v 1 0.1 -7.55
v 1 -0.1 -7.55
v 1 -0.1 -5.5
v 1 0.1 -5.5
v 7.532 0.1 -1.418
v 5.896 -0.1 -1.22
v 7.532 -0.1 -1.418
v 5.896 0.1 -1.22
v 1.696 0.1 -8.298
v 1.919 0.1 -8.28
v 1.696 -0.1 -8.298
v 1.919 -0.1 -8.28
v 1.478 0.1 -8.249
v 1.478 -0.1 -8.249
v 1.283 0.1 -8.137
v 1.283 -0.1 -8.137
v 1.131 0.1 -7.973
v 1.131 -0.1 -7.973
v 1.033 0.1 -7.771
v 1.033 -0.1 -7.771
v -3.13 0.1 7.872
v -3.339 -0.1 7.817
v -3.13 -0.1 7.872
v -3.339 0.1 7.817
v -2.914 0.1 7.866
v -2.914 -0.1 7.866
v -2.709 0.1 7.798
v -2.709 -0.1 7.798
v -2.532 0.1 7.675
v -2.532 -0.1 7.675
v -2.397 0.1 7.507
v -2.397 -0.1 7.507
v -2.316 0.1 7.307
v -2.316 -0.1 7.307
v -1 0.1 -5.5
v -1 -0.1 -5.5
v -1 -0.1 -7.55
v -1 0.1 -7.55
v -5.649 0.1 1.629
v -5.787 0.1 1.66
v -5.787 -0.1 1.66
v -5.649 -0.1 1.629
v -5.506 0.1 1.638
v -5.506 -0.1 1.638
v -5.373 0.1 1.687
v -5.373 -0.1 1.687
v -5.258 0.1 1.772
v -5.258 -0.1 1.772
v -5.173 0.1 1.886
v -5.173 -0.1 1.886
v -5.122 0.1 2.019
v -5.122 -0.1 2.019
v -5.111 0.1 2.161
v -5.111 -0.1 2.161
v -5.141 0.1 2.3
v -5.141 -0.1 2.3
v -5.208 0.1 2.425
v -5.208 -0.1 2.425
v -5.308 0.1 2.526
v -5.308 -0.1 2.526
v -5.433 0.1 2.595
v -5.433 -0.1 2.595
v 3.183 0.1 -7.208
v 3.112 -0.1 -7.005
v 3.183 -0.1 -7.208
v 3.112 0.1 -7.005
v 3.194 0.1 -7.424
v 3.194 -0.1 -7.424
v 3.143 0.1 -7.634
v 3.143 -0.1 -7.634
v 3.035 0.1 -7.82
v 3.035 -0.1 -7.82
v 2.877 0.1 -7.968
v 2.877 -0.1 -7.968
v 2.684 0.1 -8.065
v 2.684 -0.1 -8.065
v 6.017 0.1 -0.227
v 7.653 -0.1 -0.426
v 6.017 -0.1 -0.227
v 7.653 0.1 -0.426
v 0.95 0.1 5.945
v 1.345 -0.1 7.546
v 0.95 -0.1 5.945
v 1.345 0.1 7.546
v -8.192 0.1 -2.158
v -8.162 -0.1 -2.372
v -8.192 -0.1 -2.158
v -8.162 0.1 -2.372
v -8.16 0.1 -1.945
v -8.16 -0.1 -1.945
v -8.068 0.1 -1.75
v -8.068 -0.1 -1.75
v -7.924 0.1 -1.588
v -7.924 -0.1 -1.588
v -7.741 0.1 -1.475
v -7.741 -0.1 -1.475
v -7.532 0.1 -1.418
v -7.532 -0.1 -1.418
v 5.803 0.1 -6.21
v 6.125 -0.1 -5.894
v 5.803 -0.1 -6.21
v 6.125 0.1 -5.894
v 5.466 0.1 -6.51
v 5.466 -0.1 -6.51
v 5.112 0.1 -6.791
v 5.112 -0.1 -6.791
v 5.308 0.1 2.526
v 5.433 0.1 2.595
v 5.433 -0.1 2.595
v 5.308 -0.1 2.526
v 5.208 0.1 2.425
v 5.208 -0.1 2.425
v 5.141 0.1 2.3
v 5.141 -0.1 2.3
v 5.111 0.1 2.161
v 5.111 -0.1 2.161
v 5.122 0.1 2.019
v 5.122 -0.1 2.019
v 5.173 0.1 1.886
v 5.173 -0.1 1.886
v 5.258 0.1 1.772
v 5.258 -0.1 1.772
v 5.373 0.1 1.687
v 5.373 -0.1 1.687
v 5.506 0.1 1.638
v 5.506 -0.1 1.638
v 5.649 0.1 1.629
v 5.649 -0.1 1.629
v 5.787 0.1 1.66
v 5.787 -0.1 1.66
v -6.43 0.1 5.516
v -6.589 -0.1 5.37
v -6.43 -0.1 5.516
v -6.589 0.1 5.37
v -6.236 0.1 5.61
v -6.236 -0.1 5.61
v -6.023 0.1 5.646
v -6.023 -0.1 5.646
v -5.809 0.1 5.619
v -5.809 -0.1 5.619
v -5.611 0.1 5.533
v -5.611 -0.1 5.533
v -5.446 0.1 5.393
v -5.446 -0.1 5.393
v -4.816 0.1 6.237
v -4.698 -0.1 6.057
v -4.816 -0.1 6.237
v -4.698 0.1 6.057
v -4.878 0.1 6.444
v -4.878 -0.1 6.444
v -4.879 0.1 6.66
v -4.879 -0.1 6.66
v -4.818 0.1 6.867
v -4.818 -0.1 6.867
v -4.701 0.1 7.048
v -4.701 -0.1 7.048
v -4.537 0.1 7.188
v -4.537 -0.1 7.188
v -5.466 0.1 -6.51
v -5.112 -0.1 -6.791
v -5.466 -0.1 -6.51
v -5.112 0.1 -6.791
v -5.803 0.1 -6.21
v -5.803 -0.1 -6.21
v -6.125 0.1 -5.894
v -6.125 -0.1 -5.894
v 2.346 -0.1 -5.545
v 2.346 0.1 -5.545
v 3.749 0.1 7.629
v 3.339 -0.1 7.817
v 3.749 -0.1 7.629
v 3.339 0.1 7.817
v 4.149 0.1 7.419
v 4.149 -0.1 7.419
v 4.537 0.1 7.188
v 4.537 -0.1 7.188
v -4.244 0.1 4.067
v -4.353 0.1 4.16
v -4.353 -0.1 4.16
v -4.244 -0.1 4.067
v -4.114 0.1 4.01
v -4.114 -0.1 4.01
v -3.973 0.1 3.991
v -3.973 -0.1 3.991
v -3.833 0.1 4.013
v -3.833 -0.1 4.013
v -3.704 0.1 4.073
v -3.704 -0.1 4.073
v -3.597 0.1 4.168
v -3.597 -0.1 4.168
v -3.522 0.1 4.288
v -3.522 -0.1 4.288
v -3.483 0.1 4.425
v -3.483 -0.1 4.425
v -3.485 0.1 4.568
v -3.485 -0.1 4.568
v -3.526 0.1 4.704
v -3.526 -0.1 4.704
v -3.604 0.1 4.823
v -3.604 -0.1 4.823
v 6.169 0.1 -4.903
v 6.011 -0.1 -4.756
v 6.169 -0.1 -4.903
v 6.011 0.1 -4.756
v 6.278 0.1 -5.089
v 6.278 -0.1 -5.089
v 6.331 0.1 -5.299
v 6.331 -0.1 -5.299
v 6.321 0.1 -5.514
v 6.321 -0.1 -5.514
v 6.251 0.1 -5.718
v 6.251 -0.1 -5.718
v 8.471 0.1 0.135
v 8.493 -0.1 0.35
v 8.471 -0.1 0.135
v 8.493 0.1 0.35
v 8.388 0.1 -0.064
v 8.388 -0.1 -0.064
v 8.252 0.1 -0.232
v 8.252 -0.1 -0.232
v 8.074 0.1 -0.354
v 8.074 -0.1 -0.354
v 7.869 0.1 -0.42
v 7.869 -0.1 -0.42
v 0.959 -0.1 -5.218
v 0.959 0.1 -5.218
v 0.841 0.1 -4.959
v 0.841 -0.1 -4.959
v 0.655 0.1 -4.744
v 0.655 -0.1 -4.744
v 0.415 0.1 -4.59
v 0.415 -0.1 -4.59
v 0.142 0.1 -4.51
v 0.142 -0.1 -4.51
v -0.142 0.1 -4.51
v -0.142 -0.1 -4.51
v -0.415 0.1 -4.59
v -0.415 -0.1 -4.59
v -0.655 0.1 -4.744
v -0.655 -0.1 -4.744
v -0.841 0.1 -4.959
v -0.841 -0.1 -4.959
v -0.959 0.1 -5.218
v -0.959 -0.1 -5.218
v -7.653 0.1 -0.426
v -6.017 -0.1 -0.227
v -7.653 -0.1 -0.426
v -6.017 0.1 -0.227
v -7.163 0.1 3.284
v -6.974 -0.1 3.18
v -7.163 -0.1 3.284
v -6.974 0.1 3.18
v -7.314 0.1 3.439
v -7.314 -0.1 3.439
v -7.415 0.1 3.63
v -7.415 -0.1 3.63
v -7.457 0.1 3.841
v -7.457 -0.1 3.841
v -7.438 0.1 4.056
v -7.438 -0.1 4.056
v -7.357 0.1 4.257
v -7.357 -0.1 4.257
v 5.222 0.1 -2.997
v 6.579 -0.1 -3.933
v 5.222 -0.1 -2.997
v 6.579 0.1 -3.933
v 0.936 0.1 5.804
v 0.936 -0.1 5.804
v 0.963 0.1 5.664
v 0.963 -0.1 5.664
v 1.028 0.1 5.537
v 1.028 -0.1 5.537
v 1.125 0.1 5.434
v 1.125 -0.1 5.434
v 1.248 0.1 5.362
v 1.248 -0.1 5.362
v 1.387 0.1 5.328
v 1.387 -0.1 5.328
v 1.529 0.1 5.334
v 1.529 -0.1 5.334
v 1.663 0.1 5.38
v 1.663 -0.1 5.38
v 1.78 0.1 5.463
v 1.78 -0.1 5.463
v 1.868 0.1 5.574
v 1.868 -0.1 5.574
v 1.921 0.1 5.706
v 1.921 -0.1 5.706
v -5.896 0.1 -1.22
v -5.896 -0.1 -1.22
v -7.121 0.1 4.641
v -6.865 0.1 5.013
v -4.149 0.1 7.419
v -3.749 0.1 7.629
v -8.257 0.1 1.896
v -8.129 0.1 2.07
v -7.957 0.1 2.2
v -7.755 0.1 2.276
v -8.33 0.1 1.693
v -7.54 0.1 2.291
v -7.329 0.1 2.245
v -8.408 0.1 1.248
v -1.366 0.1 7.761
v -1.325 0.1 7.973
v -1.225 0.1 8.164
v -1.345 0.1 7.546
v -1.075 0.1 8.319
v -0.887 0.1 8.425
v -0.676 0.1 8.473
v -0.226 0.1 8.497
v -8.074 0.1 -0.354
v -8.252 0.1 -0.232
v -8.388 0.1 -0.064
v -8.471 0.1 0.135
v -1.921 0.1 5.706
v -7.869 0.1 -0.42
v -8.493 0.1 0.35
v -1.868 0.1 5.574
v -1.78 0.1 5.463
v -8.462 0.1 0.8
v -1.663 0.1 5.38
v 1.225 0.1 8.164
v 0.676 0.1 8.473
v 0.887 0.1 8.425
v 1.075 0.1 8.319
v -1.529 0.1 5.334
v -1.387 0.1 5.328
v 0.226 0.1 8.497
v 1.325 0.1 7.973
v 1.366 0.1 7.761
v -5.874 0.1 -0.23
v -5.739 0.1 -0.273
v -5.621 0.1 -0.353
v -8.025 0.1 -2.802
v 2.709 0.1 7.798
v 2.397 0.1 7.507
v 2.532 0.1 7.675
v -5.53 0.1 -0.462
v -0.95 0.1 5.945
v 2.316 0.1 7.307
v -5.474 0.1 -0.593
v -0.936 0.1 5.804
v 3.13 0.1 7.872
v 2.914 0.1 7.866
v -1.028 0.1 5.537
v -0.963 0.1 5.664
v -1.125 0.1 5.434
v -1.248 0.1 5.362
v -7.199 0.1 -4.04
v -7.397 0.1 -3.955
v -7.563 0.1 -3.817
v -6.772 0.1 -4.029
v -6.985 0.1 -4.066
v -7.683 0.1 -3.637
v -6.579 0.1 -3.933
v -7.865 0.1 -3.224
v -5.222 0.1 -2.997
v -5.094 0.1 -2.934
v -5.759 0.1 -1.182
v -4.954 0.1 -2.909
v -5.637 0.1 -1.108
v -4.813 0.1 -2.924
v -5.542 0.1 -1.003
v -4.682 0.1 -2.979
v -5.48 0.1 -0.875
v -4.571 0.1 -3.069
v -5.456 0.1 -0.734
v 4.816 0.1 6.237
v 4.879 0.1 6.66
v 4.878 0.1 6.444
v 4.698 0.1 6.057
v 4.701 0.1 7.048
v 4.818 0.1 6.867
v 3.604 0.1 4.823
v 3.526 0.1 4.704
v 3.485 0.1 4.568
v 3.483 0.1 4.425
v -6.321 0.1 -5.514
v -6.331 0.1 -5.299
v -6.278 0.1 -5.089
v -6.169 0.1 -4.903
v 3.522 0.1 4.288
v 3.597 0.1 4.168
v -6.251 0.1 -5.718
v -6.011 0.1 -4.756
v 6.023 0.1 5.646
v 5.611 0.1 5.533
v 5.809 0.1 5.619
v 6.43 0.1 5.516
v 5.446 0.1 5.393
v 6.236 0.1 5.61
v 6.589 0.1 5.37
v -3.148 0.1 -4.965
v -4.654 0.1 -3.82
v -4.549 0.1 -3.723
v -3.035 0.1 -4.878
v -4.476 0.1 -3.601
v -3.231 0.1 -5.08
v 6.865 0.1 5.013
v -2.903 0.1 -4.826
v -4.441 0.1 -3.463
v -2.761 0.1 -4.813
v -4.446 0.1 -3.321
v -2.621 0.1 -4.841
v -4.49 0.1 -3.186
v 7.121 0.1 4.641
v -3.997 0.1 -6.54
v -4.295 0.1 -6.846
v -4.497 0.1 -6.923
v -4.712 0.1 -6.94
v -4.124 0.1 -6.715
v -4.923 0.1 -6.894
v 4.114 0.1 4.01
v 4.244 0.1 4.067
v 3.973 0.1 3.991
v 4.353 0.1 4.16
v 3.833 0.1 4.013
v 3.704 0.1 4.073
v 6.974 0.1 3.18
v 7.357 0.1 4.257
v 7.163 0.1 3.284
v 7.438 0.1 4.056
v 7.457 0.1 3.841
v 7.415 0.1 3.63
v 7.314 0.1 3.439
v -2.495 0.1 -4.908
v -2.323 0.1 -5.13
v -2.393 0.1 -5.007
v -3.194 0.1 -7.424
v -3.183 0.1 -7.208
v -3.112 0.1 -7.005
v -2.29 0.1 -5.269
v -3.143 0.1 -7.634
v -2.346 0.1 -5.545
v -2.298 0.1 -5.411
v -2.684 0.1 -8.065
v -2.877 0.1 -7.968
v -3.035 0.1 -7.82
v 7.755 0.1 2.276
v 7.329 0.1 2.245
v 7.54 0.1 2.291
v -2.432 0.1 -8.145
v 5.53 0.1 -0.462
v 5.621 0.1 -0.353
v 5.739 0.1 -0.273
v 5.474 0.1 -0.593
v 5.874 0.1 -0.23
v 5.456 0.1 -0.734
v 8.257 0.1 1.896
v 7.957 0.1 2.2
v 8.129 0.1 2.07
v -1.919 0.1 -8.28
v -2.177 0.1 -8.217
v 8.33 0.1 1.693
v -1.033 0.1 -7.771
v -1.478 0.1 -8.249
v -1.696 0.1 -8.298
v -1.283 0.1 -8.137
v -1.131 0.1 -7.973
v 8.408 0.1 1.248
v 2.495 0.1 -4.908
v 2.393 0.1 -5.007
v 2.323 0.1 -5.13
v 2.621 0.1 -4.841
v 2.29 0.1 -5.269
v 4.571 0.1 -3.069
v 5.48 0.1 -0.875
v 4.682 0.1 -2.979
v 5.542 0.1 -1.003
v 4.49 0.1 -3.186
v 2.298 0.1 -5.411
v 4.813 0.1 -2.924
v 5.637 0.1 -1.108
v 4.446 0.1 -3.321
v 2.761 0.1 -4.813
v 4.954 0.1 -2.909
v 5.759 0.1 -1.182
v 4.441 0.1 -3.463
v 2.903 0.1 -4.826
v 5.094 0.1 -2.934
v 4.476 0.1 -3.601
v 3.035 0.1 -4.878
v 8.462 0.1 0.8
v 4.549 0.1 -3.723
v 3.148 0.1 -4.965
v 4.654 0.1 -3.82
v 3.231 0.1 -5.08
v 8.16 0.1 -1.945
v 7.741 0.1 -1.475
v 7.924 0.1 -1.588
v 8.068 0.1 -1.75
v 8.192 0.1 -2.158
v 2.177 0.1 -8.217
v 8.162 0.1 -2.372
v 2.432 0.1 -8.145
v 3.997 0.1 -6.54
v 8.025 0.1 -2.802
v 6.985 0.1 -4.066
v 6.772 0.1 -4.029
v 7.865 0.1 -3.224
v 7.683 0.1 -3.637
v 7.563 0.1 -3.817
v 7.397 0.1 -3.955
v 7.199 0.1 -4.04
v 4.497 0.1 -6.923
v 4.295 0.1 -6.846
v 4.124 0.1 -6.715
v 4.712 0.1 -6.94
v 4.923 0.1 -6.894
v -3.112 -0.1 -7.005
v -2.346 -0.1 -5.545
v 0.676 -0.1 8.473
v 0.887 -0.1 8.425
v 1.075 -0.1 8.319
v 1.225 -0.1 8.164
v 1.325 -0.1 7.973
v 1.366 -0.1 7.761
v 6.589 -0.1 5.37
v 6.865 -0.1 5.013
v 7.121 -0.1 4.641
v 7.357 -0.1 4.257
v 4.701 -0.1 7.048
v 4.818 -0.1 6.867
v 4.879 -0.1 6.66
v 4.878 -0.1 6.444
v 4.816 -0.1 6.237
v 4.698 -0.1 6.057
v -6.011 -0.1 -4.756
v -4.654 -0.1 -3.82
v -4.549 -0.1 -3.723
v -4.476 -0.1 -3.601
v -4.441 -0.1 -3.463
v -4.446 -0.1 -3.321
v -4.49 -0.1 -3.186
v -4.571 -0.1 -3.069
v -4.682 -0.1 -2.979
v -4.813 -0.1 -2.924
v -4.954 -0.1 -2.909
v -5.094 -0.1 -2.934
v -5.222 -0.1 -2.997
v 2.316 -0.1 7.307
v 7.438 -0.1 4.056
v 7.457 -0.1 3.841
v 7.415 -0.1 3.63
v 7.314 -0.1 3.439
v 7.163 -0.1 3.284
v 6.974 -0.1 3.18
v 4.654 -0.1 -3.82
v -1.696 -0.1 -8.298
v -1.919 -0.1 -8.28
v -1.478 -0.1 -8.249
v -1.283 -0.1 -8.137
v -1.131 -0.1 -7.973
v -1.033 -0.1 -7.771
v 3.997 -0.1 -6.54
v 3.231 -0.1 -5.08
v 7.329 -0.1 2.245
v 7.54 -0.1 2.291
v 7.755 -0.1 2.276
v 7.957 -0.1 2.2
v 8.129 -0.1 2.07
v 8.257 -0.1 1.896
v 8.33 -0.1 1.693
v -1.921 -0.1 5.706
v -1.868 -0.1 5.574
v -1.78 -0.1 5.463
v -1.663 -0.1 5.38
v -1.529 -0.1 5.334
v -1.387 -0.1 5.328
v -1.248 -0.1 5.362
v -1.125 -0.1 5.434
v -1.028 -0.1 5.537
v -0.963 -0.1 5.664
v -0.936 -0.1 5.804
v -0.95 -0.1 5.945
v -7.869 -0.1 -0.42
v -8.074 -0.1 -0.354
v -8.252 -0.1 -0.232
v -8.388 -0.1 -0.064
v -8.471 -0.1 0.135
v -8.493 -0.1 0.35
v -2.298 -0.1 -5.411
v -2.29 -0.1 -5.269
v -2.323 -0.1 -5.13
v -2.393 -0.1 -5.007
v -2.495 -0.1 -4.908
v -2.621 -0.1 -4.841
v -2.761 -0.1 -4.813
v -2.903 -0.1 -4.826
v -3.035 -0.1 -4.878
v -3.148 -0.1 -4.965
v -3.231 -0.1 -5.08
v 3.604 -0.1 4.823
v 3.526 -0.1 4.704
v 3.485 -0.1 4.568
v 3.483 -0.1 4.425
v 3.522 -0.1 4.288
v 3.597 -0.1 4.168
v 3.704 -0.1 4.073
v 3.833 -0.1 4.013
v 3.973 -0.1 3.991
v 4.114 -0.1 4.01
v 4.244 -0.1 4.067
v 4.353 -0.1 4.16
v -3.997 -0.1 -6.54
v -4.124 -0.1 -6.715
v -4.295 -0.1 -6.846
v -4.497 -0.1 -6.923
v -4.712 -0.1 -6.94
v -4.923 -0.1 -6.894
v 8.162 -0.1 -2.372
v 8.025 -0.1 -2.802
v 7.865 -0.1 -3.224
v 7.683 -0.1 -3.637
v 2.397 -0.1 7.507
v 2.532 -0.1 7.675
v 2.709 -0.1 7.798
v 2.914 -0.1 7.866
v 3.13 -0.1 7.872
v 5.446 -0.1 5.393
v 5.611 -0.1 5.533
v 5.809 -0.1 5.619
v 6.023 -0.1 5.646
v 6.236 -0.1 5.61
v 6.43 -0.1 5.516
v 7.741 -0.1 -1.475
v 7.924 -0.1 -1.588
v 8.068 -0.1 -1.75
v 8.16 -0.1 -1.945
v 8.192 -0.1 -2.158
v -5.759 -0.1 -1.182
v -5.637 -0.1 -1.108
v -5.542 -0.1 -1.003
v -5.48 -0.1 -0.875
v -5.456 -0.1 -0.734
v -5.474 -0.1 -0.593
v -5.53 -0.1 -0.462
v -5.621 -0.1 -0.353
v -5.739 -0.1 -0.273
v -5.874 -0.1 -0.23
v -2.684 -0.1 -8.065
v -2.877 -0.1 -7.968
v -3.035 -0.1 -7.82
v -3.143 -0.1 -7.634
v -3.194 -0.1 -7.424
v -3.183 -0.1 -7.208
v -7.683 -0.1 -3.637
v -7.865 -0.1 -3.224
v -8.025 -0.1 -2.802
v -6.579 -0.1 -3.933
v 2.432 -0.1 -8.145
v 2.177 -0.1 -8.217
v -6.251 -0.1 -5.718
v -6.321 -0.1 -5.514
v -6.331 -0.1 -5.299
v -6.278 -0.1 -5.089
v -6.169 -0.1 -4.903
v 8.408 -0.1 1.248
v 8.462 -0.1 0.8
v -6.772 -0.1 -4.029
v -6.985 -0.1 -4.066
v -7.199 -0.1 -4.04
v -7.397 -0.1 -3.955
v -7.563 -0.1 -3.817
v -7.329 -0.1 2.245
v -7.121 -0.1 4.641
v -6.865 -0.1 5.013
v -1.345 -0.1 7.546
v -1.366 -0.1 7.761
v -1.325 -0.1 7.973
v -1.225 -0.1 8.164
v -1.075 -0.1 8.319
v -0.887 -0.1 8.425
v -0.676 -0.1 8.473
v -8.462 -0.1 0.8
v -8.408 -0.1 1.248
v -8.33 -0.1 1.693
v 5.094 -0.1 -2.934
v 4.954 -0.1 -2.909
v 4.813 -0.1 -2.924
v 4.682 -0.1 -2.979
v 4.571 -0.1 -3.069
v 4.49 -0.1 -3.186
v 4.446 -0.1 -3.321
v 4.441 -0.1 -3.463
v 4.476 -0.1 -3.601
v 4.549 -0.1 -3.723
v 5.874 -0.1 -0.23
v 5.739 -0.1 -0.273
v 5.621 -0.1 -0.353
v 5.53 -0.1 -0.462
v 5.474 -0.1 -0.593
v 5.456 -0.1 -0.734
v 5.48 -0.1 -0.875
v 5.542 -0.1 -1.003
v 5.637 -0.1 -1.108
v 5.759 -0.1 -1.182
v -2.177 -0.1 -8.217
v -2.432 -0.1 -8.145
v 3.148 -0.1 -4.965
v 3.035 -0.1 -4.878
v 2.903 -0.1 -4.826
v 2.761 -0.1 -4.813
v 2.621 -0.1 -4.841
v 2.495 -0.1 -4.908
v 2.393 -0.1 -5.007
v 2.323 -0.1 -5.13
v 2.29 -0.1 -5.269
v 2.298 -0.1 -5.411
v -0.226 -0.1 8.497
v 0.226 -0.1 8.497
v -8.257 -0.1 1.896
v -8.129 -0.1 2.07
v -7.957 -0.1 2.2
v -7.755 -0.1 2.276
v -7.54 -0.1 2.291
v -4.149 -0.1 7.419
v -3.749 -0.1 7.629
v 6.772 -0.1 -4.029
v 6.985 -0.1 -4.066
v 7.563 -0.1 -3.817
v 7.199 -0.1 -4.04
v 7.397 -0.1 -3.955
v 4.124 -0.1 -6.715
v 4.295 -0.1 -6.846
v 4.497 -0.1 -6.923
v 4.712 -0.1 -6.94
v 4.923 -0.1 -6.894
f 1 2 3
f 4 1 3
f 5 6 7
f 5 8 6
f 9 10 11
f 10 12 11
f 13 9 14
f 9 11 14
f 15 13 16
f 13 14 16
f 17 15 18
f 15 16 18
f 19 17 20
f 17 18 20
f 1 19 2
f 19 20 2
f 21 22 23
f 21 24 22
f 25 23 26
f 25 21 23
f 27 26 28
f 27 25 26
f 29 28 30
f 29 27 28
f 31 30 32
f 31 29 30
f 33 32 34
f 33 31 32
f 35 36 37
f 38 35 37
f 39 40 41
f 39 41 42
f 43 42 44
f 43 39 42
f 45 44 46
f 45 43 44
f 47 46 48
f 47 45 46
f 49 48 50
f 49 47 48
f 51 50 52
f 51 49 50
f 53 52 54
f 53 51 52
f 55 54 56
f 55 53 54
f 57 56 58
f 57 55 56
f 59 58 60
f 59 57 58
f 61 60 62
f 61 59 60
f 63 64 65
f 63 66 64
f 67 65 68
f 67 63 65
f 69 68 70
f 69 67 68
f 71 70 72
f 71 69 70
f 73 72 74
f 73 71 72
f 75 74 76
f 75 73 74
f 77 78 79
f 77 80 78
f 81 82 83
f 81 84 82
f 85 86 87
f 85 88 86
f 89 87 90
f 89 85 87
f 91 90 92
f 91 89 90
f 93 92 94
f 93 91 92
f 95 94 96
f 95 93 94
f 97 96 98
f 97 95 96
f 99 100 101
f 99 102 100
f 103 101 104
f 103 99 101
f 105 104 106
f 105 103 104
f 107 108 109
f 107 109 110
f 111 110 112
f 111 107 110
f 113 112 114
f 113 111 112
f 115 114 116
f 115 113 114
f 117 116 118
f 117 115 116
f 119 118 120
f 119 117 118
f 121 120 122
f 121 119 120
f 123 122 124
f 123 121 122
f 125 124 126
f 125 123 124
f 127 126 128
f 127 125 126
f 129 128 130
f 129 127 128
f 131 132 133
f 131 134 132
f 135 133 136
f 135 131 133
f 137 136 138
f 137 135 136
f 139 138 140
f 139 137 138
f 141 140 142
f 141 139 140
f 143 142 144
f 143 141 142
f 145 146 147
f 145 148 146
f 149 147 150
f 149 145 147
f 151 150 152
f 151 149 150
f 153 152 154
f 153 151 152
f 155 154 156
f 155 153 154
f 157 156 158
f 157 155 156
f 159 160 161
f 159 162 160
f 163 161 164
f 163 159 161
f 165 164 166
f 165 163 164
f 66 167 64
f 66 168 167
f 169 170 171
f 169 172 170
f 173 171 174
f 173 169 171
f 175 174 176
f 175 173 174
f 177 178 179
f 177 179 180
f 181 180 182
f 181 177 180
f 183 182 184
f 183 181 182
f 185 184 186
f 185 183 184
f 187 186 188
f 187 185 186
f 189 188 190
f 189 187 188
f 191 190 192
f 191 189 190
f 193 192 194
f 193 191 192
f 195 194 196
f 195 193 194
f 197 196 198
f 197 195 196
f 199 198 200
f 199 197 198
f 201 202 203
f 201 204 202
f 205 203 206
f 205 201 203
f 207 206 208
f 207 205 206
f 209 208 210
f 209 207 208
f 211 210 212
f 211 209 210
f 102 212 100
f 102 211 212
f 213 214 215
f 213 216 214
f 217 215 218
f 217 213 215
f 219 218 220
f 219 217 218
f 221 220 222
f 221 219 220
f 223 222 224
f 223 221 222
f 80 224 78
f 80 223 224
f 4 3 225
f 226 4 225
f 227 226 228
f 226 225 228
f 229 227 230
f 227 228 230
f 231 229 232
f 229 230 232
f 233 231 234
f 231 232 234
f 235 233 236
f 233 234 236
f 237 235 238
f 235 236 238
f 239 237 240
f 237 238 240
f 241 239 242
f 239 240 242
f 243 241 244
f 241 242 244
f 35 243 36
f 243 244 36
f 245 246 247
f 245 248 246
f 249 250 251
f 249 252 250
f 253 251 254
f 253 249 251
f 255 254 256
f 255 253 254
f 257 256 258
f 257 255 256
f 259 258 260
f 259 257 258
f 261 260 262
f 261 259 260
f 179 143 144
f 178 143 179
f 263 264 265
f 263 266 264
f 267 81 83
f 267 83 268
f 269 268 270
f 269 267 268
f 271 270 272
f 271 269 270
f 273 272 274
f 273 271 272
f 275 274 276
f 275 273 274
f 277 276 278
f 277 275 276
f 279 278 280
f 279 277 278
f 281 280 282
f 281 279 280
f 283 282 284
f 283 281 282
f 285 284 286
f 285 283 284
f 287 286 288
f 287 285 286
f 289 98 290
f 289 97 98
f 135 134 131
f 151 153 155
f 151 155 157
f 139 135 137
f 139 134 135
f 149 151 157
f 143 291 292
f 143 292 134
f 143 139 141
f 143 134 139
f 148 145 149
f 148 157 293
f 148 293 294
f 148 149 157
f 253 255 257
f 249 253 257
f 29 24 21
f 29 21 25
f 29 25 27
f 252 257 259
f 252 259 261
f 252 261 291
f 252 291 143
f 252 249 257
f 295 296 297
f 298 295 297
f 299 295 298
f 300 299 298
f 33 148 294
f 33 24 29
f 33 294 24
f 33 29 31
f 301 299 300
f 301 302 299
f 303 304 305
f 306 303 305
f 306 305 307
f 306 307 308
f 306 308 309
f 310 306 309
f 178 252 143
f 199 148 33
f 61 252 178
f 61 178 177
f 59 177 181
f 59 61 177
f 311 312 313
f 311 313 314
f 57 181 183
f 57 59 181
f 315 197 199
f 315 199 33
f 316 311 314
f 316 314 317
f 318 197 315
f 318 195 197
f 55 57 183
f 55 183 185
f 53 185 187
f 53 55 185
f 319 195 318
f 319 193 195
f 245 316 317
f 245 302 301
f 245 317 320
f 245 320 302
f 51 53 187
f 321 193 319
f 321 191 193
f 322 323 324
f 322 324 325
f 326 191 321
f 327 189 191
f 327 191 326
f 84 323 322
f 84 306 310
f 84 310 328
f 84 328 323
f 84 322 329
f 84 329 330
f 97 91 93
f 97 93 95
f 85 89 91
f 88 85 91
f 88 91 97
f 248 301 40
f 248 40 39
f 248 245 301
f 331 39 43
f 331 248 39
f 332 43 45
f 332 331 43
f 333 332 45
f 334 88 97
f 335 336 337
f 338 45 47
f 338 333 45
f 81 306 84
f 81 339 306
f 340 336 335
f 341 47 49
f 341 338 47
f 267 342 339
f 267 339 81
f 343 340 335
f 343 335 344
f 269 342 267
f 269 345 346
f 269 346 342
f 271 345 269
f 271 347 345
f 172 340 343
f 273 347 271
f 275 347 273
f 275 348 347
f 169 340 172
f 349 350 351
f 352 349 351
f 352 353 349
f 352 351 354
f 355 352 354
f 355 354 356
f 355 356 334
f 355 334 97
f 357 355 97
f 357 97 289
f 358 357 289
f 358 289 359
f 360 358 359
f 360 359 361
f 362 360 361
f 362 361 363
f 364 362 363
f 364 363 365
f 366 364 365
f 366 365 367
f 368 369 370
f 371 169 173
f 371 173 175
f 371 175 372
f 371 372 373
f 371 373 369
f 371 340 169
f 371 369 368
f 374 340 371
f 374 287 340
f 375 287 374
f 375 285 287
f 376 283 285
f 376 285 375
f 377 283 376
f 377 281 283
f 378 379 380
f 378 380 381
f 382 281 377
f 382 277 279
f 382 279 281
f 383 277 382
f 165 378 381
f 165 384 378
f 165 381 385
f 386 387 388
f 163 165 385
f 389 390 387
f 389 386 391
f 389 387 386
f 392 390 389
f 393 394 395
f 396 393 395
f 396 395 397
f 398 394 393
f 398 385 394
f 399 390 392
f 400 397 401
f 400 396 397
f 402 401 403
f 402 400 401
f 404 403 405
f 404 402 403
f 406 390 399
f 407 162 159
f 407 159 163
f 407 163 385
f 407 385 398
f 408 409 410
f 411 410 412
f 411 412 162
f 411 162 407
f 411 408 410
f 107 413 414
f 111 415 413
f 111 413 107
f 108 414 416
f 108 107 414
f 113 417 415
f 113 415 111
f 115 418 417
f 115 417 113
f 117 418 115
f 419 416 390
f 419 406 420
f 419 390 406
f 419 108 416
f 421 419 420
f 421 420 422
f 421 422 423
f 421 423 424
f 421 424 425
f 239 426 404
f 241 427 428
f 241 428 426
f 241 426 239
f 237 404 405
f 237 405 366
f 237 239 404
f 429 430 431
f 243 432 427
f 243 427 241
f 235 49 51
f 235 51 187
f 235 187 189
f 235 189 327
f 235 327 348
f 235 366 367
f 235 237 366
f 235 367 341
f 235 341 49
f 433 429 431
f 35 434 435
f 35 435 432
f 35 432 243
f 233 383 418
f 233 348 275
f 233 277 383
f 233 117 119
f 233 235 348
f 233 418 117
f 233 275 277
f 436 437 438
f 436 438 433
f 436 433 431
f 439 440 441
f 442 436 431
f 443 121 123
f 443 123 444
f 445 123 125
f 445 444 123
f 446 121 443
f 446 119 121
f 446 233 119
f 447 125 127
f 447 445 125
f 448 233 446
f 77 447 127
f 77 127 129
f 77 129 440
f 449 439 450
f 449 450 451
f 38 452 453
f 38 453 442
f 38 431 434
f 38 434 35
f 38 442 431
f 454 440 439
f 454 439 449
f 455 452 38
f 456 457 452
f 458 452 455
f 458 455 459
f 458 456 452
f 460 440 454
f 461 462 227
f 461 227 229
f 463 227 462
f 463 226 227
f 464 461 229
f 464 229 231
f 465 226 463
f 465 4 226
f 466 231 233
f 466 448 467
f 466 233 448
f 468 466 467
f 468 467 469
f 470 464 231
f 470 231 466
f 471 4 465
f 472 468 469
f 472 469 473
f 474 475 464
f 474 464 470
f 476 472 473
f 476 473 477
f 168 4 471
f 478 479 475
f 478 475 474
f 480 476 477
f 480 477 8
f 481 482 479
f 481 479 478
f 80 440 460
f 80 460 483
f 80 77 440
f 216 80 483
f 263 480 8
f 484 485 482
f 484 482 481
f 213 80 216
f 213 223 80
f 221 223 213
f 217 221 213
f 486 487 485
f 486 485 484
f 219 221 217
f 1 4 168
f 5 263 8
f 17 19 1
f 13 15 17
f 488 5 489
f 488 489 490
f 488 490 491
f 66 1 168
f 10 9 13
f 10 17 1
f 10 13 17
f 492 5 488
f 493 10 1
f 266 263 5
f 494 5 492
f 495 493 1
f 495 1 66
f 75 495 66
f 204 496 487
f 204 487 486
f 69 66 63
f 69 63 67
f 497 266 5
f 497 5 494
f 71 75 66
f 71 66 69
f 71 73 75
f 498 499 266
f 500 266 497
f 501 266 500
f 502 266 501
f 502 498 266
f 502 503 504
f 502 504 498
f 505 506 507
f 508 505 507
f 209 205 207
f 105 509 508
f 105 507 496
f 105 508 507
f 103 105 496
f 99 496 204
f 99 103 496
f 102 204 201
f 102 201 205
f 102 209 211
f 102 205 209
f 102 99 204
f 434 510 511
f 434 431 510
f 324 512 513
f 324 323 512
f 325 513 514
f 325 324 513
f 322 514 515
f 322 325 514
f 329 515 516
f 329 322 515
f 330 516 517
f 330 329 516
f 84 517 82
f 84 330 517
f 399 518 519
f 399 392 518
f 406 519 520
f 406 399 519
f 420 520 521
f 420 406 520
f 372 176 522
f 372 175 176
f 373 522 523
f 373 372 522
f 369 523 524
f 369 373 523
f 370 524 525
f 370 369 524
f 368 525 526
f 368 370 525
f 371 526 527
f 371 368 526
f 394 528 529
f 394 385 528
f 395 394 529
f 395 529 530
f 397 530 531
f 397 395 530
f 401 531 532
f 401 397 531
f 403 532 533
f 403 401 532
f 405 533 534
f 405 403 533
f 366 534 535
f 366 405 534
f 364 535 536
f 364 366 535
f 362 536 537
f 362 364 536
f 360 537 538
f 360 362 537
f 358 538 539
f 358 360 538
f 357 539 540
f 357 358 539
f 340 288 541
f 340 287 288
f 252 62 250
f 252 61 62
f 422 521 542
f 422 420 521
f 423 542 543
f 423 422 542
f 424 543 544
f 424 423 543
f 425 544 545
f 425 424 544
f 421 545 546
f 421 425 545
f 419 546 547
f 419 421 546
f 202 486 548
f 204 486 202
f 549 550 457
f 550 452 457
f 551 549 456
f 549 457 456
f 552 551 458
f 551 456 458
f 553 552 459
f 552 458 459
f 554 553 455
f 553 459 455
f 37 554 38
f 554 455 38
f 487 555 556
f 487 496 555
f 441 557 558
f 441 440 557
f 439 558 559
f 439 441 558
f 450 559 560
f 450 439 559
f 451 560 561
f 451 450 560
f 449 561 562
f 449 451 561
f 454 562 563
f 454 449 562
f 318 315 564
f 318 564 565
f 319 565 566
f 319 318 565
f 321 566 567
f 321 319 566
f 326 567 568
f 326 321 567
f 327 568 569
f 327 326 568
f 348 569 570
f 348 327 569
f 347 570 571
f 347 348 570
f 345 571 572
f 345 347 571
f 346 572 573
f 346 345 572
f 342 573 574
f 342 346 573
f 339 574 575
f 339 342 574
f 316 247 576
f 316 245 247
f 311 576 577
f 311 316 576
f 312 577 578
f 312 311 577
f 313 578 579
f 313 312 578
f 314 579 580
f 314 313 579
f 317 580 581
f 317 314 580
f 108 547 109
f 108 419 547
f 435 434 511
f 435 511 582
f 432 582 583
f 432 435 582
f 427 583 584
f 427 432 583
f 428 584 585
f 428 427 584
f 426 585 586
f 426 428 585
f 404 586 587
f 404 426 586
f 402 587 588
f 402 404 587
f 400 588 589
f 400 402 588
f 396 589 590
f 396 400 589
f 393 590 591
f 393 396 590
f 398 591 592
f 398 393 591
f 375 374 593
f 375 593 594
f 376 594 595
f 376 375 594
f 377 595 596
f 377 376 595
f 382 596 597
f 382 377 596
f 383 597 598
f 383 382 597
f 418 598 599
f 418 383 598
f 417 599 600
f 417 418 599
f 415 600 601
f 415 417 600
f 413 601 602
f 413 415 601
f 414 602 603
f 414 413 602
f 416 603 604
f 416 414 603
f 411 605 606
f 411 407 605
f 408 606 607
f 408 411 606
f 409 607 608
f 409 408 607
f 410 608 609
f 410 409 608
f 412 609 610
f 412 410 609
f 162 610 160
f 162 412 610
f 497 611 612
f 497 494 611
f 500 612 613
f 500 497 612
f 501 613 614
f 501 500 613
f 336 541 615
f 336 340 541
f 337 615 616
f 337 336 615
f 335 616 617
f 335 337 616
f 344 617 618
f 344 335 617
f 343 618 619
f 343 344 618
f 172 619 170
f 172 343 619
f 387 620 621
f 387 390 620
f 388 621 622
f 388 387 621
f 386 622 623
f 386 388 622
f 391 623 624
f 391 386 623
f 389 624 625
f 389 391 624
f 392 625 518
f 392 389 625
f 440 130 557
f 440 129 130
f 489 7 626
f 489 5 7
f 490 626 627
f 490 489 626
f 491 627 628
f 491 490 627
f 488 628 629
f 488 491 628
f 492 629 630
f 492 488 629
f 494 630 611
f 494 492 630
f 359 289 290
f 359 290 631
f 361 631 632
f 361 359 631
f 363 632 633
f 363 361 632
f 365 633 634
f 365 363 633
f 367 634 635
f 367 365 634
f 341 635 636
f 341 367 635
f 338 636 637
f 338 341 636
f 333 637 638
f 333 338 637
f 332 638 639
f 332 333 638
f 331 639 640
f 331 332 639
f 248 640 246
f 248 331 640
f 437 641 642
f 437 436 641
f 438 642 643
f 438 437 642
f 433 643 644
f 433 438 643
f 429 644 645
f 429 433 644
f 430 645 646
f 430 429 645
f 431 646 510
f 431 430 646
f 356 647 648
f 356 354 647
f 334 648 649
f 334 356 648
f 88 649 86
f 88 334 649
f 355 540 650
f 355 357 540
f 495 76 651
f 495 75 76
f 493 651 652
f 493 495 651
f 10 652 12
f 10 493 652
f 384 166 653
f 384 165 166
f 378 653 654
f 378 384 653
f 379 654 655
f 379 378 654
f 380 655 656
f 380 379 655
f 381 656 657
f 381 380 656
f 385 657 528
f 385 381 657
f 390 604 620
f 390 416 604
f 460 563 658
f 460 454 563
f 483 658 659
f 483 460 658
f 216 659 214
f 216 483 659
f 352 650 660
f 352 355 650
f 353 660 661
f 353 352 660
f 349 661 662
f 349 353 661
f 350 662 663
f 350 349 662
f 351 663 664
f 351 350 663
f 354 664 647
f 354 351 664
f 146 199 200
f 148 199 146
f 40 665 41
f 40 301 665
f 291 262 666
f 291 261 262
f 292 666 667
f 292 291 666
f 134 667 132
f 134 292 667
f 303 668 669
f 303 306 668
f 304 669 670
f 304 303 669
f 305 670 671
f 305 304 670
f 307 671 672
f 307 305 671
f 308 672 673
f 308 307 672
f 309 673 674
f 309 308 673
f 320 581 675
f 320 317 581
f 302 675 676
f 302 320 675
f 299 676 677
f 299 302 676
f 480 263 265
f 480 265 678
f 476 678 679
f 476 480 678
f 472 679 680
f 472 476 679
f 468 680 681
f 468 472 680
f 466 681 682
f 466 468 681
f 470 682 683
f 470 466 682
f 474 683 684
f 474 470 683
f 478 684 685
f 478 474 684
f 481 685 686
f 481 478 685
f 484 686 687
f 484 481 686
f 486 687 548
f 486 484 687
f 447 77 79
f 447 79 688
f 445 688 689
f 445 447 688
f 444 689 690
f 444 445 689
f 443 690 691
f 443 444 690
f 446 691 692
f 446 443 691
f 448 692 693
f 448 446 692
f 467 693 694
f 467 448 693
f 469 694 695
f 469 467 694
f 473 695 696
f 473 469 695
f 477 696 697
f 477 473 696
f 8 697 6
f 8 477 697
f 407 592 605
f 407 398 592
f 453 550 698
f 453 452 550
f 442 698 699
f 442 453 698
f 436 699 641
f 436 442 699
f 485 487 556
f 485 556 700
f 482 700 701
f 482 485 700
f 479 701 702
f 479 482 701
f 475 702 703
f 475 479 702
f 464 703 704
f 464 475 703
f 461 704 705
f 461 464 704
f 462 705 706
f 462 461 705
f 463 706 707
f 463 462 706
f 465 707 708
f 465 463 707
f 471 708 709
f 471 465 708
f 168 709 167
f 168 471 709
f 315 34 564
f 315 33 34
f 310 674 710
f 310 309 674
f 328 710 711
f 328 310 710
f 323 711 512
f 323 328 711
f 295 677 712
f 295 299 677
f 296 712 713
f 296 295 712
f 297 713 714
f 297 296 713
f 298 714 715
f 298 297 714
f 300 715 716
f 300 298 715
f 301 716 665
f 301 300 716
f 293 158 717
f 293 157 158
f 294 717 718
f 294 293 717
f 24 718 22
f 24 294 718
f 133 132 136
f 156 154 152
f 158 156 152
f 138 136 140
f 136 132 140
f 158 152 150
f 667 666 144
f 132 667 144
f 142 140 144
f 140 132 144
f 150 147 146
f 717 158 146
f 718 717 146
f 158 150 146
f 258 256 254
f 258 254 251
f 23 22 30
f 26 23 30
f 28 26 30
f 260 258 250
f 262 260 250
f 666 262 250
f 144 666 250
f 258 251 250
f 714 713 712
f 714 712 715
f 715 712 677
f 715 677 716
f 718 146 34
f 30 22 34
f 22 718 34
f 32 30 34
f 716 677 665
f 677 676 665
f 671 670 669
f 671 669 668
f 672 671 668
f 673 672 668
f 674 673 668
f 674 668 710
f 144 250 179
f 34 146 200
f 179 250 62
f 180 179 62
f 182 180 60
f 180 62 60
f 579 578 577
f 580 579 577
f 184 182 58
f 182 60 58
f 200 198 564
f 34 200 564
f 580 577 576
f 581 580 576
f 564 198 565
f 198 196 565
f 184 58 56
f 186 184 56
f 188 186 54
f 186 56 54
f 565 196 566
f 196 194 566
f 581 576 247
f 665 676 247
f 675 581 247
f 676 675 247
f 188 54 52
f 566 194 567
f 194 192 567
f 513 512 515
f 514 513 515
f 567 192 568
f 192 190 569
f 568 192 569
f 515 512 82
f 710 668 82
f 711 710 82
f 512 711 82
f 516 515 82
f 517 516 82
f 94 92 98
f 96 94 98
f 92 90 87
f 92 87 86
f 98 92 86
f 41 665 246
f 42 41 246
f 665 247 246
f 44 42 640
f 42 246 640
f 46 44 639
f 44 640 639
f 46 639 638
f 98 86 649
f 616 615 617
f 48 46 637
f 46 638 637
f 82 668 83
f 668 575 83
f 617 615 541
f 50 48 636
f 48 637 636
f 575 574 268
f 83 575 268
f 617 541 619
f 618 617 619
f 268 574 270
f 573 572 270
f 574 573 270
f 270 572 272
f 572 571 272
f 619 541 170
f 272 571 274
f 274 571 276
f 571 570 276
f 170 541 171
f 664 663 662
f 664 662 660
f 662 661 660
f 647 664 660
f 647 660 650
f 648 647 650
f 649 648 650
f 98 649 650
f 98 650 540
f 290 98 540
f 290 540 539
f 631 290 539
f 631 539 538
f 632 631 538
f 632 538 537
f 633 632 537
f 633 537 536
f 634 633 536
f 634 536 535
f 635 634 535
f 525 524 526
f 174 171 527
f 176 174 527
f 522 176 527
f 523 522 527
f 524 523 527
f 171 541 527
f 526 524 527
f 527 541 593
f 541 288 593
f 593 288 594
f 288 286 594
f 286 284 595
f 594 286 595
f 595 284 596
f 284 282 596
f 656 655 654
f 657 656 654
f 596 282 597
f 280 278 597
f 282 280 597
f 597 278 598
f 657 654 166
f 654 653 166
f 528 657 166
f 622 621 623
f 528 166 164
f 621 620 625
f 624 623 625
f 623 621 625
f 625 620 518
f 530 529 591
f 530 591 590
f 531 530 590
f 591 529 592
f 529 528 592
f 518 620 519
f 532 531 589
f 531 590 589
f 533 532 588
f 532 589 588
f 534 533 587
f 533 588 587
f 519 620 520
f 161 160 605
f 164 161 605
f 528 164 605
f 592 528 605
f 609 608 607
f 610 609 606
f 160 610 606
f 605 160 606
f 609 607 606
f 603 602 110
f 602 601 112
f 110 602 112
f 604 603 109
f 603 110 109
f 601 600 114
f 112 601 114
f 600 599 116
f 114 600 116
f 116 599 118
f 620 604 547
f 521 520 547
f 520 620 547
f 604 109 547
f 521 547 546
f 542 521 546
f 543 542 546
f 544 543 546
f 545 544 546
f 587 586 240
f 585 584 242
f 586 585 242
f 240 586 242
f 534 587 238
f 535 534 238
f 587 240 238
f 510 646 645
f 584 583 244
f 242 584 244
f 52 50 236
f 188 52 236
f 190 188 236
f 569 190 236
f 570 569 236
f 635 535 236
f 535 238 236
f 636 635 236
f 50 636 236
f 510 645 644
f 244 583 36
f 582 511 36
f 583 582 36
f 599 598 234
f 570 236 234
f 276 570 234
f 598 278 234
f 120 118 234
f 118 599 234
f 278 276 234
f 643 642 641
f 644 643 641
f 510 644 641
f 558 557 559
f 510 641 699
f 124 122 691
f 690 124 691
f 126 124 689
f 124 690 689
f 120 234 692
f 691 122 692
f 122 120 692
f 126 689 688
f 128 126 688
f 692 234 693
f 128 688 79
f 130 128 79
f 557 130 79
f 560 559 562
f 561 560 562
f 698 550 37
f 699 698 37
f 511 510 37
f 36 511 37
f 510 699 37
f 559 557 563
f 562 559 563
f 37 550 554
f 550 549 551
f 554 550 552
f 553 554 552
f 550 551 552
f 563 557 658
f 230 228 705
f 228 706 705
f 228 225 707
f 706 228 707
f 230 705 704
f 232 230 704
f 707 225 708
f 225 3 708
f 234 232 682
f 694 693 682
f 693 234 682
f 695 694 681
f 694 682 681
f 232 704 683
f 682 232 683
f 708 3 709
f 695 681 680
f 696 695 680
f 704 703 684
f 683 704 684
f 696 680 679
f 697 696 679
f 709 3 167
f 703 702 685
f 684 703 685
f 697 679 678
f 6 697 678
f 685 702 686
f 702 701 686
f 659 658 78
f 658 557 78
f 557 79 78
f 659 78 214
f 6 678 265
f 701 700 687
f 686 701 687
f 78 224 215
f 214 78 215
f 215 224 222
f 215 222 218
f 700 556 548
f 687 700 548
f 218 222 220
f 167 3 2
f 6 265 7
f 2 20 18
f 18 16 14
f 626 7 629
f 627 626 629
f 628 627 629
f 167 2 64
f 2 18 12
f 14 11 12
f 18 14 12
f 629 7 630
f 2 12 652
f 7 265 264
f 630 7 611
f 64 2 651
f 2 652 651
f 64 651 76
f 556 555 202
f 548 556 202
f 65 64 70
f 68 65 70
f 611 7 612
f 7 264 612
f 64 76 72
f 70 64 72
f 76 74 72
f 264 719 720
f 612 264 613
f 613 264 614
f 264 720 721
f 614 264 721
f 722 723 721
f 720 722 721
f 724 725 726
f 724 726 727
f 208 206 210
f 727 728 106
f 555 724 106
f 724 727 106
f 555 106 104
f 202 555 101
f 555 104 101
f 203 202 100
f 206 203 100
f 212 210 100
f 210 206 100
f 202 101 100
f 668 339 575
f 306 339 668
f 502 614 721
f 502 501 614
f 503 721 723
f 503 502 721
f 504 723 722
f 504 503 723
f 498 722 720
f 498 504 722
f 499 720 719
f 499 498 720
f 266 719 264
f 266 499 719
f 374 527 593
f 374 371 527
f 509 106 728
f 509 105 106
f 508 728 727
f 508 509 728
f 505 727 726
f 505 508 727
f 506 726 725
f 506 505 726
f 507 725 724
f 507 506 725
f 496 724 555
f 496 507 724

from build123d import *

# Parameters (mm, degrees)
BOSS_EXTRUDE1_DEPTH     = 0.1
CUT_EXTRUDE1_DEPTH      = 1.1
CUT_EXTRUDE1_DEPTH_BACK = 1.1
FILLET1_R               = 0.75


with BuildPart() as part:
    # Sketch1 → Boss-Extrude1 (new body, symmetric)
    with BuildSketch(Plane(origin=(0, 0, 0), x_dir=(1, 0, 0), z_dir=(0, 1, 0))):
        with BuildLine():
            Line((-0.5, 6), (-0.5, 8.485281374))
            ThreePointArc((-0.5, 8.485281374), (-2.034183146, 8.253005448), (-3.500578863, 7.745705108))
            Line((-3.500578863, 7.745705108), (-2.345611019, 5.54509774))
            ThreePointArc((-2.345611019, 5.54509774), (-2.555977446, 4.870008141), (-3.231067045, 5.080374568))
            Line((-3.231067045, 5.080374568), (-4.386034889, 7.280981936))
            ThreePointArc((-4.386034889, 7.280981936), (-5.636542595, 6.362341359), (-6.699217295, 5.231681148))
            Line((-6.699217295, 5.231681148), (-4.653870822, 3.819880413))
            ThreePointArc((-4.653870822, 3.819880413), (-4.526411262, 3.124356107), (-5.221935569, 2.996896547))
            Line((-5.221935569, 2.996896547), (-7.267282042, 4.408697282))
            ThreePointArc((-7.267282042, 4.408697282), (-7.947638063, 3.01414154), (-8.363145779, 1.519142085))
            Line((-8.363145779, 1.519142085), (-5.895984904, 1.219574519))
            ThreePointArc((-5.895984904, 1.219574519), (-5.459898808, 0.662951741), (-6.016521585, 0.226865644))
            Line((-6.016521585, 0.226865644), (-8.48368246, 0.526433211))
            ThreePointArc((-8.48368246, 0.526433211), (-8.43802543, -1.024561782), (-8.111178352, -2.541414122))
            Line((-8.111178352, -2.541414122), (-5.7873999, -1.660121201))
            ThreePointArc((-5.7873999, -1.660121201), (-5.142589335, -1.950326879), (-5.432795013, -2.595137444))
            Line((-5.432795013, -2.595137444), (-7.756573465, -3.476430365))
            ThreePointArc((-7.756573465, -3.476430365), (-6.99536286, -4.828550347), (-6.001037715, -6.019762981))
            Line((-6.001037715, -6.019762981), (-4.352991324, -4.15950316))
            ThreePointArc((-4.352991324, -4.15950316), (-3.64717462, -4.116809115), (-3.604480575, -4.822625818))
            Line((-3.604480575, -4.822625818), (-5.252526967, -6.682885639))
            ThreePointArc((-5.252526967, -6.682885639), (-3.950146962, -7.526376218), (-2.516131657, -8.119056687))
            Line((-2.516131657, -8.119056687), (-1.921364894, -5.705993072))
            ThreePointArc((-1.921364894, -5.705993072), (-1.316236154, -5.340179996), (-0.950423077, -5.945308737))
            Line((-0.950423077, -5.945308737), (-1.54518984, -8.358372351))
            ThreePointArc((-1.54518984, -8.358372351), (0, -8.5), (1.54518984, -8.358372351))
            Line((1.54518984, -8.358372351), (0.950423077, -5.945308737))
            ThreePointArc((0.950423077, -5.945308737), (1.316236154, -5.340179996), (1.921364894, -5.705993072))
            Line((1.921364894, -5.705993072), (2.516131657, -8.119056687))
            ThreePointArc((2.516131657, -8.119056687), (3.950146962, -7.526376218), (5.252526967, -6.682885639))
            Line((5.252526967, -6.682885639), (3.604480575, -4.822625818))
            ThreePointArc((3.604480575, -4.822625818), (3.64717462, -4.116809115), (4.352991324, -4.15950316))
            Line((4.352991324, -4.15950316), (6.001037715, -6.019762981))
            ThreePointArc((6.001037715, -6.019762981), (6.99536286, -4.828550347), (7.756573465, -3.476430365))
            Line((7.756573465, -3.476430365), (5.432795013, -2.595137444))
            ThreePointArc((5.432795013, -2.595137444), (5.142589335, -1.950326879), (5.7873999, -1.660121201))
            Line((5.7873999, -1.660121201), (8.111178352, -2.541414122))
            ThreePointArc((8.111178352, -2.541414122), (8.43802543, -1.024561782), (8.48368246, 0.526433211))
            Line((8.48368246, 0.526433211), (6.016521585, 0.226865644))
            ThreePointArc((6.016521585, 0.226865644), (5.459898808, 0.662951741), (5.895984904, 1.219574519))
            Line((5.895984904, 1.219574519), (8.363145779, 1.519142085))
            ThreePointArc((8.363145779, 1.519142085), (7.947638063, 3.01414154), (7.267282042, 4.408697282))
            Line((7.267282042, 4.408697282), (5.221935569, 2.996896547))
            ThreePointArc((5.221935569, 2.996896547), (4.526411262, 3.124356107), (4.653870822, 3.819880413))
            Line((4.653870822, 3.819880413), (6.699217295, 5.231681148))
            ThreePointArc((6.699217295, 5.231681148), (5.636542595, 6.362341359), (4.386034889, 7.280981936))
            Line((4.386034889, 7.280981936), (3.231067045, 5.080374568))
            ThreePointArc((3.231067045, 5.080374568), (2.555977446, 4.870008141), (2.345611019, 5.54509774))
            Line((2.345611019, 5.54509774), (3.500578863, 7.745705108))
            ThreePointArc((3.500578863, 7.745705108), (2.034183146, 8.253005448), (0.5, 8.485281374))
            Line((0.5, 8.485281374), (0.5, 6))
            ThreePointArc((0.5, 6), (0, 5.5), (-0.5, 6))
        make_face()
    extrude(amount=BOSS_EXTRUDE1_DEPTH, both=True)

    # Sketch2 → Cut-Extrude1 (cut, two sides)
    with BuildSketch(Plane(origin=(0, 0, 0), x_dir=(1, 0, 0), z_dir=(0, 1, 0))) as cut_extrude1_sk:
        with BuildLine():
            Line((-1, 5.5), (-1, 8.485281374))
            Line((-1, 8.485281374), (1, 8.485281374))
            Line((1, 8.485281374), (1, 5.5))
            ThreePointArc((1, 5.5), (0, 4.5), (-1, 5.5))
        make_face()
    extrude(amount=CUT_EXTRUDE1_DEPTH, mode=Mode.SUBTRACT)
    extrude(cut_extrude1_sk.sketch, amount=-CUT_EXTRUDE1_DEPTH_BACK, mode=Mode.SUBTRACT)

    # Fillet1
    fillet1_edges = [part.edges().sort_by_distance(p)[0] for p in [
        (-1, 0, -8.440971508),
        (1, 0, -8.440971508),
        (3.500578863, 0, -7.745705108),
        (4.386034889, 0, -7.280981936),
        (6.699217295, 0, -5.231681148),
        (7.267282042, 0, -4.408697282),
        (8.363145779, 0, -1.519142085),
        (8.48368246, 0, -0.526433211),
        (8.111178352, 0, 2.541414122),
        (7.756573465, 0, 3.476430365),
        (6.001037715, 0, 6.019762981),
        (5.252526967, 0, 6.682885639),
        (2.516131657, 0, 8.119056687),
        (1.54518984, 0, 8.358372351),
        (-1.54518984, 0, 8.358372351),
        (-2.516131657, 0, 8.119056687),
        (-5.252526967, 0, 6.682885639),
        (-6.001037715, 0, 6.019762981),
        (-7.756573465, 0, 3.476430365),
        (-8.111178352, 0, 2.541414122),
        (-8.48368246, 0, -0.526433211),
        (-8.363145779, 0, -1.519142085),
        (-7.267282042, 0, -4.408697282),
        (-6.699217295, 0, -5.231681148),
        (-4.386034889, 0, -7.280981936),
        (-3.500578863, 0, -7.745705108),
    ]]
    fillet(fillet1_edges, radius=FILLET1_R)


solid = part.part
